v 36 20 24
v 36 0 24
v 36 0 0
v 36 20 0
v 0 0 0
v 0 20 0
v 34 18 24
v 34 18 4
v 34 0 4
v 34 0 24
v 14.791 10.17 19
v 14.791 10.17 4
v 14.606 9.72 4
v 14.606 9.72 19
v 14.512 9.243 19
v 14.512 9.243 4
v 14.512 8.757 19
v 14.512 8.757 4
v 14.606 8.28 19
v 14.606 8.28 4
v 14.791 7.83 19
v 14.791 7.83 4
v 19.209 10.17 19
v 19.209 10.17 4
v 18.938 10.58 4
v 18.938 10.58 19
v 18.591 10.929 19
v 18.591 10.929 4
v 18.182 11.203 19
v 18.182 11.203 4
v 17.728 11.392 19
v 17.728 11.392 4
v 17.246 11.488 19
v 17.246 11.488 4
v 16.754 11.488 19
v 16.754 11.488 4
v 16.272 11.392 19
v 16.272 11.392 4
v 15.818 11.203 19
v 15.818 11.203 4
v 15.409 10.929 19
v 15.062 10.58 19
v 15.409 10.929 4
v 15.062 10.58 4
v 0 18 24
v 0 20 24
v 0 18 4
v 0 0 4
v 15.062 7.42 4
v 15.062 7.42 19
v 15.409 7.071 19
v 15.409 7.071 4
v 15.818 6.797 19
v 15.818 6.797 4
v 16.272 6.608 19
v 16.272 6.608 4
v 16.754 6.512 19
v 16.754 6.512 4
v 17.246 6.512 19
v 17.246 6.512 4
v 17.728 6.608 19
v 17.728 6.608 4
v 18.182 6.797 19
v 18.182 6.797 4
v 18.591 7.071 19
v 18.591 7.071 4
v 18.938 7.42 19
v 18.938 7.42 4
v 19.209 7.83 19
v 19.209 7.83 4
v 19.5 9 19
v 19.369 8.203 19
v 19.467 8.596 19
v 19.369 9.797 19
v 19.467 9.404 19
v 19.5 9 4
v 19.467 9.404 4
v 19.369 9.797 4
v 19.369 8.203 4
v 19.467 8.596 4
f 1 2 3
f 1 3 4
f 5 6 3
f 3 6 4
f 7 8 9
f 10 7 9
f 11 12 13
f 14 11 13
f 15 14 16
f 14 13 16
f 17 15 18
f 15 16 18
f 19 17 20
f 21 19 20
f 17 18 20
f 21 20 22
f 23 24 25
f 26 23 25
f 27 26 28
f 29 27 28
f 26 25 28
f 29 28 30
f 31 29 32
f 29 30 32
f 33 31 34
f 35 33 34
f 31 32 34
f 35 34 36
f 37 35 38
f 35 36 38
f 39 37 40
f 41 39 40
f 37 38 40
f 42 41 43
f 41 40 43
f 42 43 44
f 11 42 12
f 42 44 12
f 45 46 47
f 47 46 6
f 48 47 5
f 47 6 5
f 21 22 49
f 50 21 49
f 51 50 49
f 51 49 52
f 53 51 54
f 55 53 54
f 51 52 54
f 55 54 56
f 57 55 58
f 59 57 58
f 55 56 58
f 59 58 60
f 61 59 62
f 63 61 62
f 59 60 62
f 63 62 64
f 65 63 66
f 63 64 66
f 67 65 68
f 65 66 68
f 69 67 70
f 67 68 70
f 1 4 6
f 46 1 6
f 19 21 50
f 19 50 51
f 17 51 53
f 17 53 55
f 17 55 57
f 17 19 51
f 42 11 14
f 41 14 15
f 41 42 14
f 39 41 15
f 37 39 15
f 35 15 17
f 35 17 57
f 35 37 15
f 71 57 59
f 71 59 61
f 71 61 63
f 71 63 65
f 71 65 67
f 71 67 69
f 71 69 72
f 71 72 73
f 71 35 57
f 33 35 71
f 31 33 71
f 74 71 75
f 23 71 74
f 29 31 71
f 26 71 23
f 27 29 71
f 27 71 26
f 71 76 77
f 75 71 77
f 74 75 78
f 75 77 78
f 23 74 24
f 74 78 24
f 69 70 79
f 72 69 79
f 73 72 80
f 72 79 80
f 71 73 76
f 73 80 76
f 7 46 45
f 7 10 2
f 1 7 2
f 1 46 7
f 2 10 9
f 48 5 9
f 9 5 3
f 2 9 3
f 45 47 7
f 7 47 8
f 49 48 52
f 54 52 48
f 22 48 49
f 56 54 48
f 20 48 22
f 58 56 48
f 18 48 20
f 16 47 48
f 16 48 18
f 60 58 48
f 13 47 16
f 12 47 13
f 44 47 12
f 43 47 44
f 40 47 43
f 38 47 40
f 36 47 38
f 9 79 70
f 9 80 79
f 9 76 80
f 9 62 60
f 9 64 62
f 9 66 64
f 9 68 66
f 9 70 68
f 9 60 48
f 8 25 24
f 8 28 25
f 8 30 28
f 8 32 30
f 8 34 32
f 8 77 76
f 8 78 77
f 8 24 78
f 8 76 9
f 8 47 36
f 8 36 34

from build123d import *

# Parameters (mm, degrees)
F0_W     = 36
F0_H     = 20
F1_DEPTH = 4
F3_DEPTH = 20
F5_DEPTH = 15


with BuildPart() as f1:
    # F0 (on Top) → F1 (new body)
    with BuildSketch(Plane.XY):
        with Locations((18, 10)):
            Rectangle(F0_W, F0_H)
    extrude(amount=F1_DEPTH)

    # F2 (on face) → F3 (join)
    with BuildSketch(Plane.XY.offset(4)):
        Polygon((36, 20), (0, 20), (0, 18), (34, 18), (34, 0), (36, 0), align=None)
    extrude(amount=F3_DEPTH)

    # F4 (on face) → F5 (join)
    with BuildSketch(Plane.XY.offset(4)):
        with BuildLine():
            ThreePointArc((19.20947, 10.169719), (17, 11.5), (14.79053, 10.169719))
            Line((14.79053, 10.169719), (17, 9))
            Line((17, 9), (19.20947, 10.169719))
        make_face()
        with BuildLine():
            Line((17, 9), (14.79053, 10.169719))
            ThreePointArc((14.79053, 10.169719), (14.5, 9), (14.79053, 7.830281))
            Line((14.79053, 7.830281), (17, 9))
        make_face()
        with BuildLine():
            Line((19.20947, 10.169719), (17, 9))
            Line((17, 9), (19.20947, 7.830281))
            ThreePointArc((19.20947, 7.830281), (19.426281, 8.39737), (19.5, 9))
            ThreePointArc((19.5, 9), (19.426281, 9.60263), (19.20947, 10.169719))
        make_face()
        with BuildLine():
            Line((19.20947, 7.830281), (17, 9))
            Line((17, 9), (14.79053, 7.830281))
            ThreePointArc((14.79053, 7.830281), (17, 6.5), (19.20947, 7.830281))
        make_face()
    extrude(amount=F5_DEPTH)


solid = f1.part
